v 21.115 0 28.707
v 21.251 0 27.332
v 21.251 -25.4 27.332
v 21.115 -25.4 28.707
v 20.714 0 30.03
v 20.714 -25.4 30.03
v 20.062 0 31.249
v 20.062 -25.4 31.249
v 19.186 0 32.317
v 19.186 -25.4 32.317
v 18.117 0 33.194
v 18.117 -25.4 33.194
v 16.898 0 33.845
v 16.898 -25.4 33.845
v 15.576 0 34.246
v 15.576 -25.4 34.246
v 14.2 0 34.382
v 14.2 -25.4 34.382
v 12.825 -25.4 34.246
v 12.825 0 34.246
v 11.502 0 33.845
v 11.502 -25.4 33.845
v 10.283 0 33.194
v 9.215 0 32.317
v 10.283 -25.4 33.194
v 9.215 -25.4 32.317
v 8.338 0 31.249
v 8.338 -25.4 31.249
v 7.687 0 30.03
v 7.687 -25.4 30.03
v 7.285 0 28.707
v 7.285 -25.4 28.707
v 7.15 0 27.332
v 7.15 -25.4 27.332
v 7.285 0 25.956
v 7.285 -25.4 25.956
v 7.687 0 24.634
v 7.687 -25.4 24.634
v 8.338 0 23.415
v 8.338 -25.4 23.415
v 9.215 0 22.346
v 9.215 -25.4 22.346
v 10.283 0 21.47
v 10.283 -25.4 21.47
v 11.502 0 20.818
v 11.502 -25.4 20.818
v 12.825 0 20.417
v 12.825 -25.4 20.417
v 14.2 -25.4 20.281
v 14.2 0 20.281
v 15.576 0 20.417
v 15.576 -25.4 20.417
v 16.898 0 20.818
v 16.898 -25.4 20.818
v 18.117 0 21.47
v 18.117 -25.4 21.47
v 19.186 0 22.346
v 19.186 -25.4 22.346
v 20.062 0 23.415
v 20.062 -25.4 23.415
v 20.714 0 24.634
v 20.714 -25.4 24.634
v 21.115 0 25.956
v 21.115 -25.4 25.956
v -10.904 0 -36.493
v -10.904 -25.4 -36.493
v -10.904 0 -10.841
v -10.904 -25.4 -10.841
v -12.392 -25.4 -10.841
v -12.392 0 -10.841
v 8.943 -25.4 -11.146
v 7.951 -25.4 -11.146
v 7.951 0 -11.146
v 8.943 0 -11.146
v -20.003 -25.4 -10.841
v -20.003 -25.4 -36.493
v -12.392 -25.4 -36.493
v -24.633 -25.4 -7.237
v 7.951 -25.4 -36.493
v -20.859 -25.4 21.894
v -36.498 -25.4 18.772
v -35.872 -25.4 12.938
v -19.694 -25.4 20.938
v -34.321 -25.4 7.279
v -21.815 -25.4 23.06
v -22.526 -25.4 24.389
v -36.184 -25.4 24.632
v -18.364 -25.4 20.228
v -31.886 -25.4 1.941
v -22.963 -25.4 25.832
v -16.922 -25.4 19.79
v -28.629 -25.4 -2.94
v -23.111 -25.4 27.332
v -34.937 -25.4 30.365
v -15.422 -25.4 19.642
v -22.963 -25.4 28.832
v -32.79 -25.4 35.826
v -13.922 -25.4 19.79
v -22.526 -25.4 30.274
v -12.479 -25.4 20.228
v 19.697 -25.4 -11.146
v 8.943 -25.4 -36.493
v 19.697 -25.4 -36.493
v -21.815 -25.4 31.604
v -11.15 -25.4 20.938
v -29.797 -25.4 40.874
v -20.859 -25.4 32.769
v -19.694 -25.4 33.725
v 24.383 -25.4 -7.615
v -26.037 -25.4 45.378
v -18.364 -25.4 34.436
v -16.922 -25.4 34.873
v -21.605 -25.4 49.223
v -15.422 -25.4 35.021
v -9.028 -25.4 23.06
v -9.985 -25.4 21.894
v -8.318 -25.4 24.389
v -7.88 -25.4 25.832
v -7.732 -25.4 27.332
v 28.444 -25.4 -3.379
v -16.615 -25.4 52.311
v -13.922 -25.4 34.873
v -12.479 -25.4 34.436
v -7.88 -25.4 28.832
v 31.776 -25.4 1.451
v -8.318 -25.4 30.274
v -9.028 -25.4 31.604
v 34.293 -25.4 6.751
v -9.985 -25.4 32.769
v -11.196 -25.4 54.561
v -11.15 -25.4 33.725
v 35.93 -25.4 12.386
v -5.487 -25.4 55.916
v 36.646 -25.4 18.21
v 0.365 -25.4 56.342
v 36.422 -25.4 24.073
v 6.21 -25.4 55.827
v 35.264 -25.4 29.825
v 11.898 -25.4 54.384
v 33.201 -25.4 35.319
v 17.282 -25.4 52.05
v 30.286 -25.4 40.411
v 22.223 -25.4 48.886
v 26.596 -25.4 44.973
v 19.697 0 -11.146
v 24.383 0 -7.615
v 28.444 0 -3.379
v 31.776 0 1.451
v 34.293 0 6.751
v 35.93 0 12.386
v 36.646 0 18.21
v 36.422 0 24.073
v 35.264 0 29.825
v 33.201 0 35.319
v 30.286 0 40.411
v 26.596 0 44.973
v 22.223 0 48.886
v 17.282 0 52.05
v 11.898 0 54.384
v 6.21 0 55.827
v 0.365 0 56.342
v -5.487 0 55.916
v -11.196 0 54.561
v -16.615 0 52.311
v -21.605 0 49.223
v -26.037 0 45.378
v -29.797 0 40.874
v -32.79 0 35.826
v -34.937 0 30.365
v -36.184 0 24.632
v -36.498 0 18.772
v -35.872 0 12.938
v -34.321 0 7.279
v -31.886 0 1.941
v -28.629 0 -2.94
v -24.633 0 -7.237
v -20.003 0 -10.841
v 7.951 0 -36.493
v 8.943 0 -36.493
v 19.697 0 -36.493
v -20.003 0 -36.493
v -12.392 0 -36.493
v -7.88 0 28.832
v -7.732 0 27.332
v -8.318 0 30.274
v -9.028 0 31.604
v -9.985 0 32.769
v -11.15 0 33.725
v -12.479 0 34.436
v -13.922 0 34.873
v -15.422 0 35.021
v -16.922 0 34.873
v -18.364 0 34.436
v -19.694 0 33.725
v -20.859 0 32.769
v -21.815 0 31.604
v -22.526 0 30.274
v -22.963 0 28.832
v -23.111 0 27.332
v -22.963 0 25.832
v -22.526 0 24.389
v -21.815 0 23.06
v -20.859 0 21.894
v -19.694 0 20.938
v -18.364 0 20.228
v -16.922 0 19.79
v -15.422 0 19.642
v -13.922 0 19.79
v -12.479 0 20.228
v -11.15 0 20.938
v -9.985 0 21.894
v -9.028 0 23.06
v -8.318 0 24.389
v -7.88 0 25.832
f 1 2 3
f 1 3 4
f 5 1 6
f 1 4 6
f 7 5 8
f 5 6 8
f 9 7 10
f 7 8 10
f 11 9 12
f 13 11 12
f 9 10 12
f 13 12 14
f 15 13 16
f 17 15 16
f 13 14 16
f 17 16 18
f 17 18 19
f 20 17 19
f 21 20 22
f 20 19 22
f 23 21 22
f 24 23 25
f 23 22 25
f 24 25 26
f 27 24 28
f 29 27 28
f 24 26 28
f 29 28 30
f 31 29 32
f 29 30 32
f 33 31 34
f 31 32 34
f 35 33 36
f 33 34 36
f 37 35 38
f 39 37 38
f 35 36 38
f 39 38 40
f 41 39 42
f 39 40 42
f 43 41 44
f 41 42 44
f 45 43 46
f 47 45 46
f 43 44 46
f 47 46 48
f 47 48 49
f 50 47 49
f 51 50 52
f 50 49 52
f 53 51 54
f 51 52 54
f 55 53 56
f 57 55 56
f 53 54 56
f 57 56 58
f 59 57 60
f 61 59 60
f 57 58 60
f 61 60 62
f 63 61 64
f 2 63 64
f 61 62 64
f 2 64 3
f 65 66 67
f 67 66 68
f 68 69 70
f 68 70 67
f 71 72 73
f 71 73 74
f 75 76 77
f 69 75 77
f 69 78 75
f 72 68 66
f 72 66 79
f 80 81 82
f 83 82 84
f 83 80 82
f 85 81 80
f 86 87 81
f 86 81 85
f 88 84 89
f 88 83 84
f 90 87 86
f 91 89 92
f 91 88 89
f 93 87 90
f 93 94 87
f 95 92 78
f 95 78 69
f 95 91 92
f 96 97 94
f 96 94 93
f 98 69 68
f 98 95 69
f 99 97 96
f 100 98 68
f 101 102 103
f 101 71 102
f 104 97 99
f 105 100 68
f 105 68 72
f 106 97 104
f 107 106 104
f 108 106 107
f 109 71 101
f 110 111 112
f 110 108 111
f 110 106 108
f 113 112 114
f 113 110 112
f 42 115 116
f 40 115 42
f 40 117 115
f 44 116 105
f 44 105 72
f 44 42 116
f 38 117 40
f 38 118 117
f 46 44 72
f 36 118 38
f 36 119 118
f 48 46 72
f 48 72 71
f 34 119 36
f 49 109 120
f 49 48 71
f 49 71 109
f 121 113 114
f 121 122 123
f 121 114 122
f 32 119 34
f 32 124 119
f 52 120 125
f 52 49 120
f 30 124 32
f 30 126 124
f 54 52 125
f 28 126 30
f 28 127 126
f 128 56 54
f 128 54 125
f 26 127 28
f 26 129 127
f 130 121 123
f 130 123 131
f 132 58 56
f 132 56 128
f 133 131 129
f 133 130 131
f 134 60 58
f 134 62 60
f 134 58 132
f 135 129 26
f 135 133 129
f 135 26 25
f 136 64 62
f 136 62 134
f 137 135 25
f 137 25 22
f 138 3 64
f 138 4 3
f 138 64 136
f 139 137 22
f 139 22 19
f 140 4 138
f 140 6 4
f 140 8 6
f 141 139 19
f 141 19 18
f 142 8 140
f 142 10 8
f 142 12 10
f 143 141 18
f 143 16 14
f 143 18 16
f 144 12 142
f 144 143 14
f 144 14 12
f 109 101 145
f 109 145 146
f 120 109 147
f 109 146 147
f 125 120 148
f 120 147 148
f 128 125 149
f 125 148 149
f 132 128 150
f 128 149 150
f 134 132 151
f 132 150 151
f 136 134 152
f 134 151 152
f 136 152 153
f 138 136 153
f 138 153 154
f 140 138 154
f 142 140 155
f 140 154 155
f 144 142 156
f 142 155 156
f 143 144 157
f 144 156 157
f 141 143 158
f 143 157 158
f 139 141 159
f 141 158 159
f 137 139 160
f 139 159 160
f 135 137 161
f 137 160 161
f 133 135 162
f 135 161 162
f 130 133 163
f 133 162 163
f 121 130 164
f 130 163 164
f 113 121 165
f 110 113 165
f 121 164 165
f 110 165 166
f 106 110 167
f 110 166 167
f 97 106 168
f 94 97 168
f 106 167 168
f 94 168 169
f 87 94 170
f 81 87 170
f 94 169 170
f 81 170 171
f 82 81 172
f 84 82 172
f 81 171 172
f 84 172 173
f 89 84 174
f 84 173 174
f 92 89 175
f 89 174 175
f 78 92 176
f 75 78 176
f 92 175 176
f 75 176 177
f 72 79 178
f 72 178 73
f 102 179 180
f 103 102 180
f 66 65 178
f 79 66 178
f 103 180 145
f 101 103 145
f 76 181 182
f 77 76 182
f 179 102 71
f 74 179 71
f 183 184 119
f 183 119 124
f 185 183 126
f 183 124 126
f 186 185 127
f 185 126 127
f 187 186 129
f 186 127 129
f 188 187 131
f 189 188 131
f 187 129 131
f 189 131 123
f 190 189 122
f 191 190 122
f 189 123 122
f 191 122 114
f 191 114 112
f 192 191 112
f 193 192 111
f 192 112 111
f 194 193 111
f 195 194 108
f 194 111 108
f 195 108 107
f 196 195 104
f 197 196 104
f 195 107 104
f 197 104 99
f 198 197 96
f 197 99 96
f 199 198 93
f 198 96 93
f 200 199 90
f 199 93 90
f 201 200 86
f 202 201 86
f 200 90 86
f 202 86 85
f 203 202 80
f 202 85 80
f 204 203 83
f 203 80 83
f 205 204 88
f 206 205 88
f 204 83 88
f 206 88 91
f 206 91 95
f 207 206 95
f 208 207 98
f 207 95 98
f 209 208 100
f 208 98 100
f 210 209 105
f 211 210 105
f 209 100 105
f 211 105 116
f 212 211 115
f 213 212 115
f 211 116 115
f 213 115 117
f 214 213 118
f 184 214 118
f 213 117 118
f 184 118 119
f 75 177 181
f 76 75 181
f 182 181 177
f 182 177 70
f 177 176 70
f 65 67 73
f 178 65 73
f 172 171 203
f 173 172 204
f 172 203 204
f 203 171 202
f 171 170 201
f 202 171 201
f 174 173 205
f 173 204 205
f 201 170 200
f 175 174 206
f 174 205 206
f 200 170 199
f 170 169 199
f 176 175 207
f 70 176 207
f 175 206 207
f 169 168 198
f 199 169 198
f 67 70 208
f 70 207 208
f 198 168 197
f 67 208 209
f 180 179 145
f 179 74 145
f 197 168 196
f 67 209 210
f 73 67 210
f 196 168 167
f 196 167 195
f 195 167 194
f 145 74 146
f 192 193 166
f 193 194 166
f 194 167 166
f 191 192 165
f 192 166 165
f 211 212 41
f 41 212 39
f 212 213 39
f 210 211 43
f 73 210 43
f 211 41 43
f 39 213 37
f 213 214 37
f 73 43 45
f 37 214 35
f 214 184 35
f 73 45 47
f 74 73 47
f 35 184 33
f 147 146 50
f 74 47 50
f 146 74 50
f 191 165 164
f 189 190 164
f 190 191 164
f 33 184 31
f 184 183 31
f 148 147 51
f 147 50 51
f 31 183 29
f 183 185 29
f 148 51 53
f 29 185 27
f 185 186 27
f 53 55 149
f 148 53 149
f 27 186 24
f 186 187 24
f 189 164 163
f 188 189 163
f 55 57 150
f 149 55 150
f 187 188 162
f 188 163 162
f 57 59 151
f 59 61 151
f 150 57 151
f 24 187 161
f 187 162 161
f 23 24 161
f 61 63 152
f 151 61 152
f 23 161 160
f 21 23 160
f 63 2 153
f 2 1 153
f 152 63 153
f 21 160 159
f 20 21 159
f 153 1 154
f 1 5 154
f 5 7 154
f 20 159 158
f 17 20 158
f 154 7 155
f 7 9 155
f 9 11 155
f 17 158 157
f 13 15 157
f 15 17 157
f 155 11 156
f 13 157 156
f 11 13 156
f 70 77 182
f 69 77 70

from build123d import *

# Parameters (mm, degrees)
F1_DEPTH = 25.4
F2_W     = 1.488530077
F2_H     = 25.6520612165
F2_W_2   = 0.9923540056
F2_H_2   = 25.346679613
F3_DEPTH = 25.4
F4_R     = 7.6893132266
F4_R_2   = 7.0502845775
F5_DEPTH = 25.4


with BuildPart() as f1:
    # F0 (on Front) → F1 (new body)
    with BuildSketch(Plane.XZ):
        with BuildLine():
            Line((19.6971185505, -36.4931114018), (19.6971185505, -11.1464317888))
            ThreePointArc((19.6971185505, -11.1464317888), (0.3652750896, 56.3419043865), (-20.0025010854, -10.8410501853))
            Line((-20.0025010854, -10.8410501853), (-20.0025010854, -36.4931114018))
            Line((-20.0025010854, -36.4931114018), (-7.4818506837, -36.4931114018))
            Line((-7.4818506837, -36.4931114018), (6.8710884079, -36.4931114018))
            Line((6.8710884079, -36.4931114018), (19.6971185505, -36.4931114018))
        make_face()
    extrude(amount=F1_DEPTH)

    # F2 (on face) → F3 (cut)
    with BuildSketch(Plane.XZ.offset(25.4)):
        with Locations((-11.6479513235, -23.6670807935)):
            Rectangle(F2_W, F2_H)
        with Locations((8.4472019225, -23.8197715953)):
            Rectangle(F2_W_2, F2_H_2)
    extrude(amount=-F3_DEPTH, mode=Mode.SUBTRACT)

    # F4 (on face) → F5 (cut)
    with BuildSketch(Plane.XZ.offset(25.4)):
        with Locations((-15.4217751697, 27.3316595703)):
            Circle(F4_R)
        with Locations((14.2002468929, 27.3316595703)):
            Circle(F4_R_2)
    extrude(amount=-F5_DEPTH, mode=Mode.SUBTRACT)


solid = f1.part
